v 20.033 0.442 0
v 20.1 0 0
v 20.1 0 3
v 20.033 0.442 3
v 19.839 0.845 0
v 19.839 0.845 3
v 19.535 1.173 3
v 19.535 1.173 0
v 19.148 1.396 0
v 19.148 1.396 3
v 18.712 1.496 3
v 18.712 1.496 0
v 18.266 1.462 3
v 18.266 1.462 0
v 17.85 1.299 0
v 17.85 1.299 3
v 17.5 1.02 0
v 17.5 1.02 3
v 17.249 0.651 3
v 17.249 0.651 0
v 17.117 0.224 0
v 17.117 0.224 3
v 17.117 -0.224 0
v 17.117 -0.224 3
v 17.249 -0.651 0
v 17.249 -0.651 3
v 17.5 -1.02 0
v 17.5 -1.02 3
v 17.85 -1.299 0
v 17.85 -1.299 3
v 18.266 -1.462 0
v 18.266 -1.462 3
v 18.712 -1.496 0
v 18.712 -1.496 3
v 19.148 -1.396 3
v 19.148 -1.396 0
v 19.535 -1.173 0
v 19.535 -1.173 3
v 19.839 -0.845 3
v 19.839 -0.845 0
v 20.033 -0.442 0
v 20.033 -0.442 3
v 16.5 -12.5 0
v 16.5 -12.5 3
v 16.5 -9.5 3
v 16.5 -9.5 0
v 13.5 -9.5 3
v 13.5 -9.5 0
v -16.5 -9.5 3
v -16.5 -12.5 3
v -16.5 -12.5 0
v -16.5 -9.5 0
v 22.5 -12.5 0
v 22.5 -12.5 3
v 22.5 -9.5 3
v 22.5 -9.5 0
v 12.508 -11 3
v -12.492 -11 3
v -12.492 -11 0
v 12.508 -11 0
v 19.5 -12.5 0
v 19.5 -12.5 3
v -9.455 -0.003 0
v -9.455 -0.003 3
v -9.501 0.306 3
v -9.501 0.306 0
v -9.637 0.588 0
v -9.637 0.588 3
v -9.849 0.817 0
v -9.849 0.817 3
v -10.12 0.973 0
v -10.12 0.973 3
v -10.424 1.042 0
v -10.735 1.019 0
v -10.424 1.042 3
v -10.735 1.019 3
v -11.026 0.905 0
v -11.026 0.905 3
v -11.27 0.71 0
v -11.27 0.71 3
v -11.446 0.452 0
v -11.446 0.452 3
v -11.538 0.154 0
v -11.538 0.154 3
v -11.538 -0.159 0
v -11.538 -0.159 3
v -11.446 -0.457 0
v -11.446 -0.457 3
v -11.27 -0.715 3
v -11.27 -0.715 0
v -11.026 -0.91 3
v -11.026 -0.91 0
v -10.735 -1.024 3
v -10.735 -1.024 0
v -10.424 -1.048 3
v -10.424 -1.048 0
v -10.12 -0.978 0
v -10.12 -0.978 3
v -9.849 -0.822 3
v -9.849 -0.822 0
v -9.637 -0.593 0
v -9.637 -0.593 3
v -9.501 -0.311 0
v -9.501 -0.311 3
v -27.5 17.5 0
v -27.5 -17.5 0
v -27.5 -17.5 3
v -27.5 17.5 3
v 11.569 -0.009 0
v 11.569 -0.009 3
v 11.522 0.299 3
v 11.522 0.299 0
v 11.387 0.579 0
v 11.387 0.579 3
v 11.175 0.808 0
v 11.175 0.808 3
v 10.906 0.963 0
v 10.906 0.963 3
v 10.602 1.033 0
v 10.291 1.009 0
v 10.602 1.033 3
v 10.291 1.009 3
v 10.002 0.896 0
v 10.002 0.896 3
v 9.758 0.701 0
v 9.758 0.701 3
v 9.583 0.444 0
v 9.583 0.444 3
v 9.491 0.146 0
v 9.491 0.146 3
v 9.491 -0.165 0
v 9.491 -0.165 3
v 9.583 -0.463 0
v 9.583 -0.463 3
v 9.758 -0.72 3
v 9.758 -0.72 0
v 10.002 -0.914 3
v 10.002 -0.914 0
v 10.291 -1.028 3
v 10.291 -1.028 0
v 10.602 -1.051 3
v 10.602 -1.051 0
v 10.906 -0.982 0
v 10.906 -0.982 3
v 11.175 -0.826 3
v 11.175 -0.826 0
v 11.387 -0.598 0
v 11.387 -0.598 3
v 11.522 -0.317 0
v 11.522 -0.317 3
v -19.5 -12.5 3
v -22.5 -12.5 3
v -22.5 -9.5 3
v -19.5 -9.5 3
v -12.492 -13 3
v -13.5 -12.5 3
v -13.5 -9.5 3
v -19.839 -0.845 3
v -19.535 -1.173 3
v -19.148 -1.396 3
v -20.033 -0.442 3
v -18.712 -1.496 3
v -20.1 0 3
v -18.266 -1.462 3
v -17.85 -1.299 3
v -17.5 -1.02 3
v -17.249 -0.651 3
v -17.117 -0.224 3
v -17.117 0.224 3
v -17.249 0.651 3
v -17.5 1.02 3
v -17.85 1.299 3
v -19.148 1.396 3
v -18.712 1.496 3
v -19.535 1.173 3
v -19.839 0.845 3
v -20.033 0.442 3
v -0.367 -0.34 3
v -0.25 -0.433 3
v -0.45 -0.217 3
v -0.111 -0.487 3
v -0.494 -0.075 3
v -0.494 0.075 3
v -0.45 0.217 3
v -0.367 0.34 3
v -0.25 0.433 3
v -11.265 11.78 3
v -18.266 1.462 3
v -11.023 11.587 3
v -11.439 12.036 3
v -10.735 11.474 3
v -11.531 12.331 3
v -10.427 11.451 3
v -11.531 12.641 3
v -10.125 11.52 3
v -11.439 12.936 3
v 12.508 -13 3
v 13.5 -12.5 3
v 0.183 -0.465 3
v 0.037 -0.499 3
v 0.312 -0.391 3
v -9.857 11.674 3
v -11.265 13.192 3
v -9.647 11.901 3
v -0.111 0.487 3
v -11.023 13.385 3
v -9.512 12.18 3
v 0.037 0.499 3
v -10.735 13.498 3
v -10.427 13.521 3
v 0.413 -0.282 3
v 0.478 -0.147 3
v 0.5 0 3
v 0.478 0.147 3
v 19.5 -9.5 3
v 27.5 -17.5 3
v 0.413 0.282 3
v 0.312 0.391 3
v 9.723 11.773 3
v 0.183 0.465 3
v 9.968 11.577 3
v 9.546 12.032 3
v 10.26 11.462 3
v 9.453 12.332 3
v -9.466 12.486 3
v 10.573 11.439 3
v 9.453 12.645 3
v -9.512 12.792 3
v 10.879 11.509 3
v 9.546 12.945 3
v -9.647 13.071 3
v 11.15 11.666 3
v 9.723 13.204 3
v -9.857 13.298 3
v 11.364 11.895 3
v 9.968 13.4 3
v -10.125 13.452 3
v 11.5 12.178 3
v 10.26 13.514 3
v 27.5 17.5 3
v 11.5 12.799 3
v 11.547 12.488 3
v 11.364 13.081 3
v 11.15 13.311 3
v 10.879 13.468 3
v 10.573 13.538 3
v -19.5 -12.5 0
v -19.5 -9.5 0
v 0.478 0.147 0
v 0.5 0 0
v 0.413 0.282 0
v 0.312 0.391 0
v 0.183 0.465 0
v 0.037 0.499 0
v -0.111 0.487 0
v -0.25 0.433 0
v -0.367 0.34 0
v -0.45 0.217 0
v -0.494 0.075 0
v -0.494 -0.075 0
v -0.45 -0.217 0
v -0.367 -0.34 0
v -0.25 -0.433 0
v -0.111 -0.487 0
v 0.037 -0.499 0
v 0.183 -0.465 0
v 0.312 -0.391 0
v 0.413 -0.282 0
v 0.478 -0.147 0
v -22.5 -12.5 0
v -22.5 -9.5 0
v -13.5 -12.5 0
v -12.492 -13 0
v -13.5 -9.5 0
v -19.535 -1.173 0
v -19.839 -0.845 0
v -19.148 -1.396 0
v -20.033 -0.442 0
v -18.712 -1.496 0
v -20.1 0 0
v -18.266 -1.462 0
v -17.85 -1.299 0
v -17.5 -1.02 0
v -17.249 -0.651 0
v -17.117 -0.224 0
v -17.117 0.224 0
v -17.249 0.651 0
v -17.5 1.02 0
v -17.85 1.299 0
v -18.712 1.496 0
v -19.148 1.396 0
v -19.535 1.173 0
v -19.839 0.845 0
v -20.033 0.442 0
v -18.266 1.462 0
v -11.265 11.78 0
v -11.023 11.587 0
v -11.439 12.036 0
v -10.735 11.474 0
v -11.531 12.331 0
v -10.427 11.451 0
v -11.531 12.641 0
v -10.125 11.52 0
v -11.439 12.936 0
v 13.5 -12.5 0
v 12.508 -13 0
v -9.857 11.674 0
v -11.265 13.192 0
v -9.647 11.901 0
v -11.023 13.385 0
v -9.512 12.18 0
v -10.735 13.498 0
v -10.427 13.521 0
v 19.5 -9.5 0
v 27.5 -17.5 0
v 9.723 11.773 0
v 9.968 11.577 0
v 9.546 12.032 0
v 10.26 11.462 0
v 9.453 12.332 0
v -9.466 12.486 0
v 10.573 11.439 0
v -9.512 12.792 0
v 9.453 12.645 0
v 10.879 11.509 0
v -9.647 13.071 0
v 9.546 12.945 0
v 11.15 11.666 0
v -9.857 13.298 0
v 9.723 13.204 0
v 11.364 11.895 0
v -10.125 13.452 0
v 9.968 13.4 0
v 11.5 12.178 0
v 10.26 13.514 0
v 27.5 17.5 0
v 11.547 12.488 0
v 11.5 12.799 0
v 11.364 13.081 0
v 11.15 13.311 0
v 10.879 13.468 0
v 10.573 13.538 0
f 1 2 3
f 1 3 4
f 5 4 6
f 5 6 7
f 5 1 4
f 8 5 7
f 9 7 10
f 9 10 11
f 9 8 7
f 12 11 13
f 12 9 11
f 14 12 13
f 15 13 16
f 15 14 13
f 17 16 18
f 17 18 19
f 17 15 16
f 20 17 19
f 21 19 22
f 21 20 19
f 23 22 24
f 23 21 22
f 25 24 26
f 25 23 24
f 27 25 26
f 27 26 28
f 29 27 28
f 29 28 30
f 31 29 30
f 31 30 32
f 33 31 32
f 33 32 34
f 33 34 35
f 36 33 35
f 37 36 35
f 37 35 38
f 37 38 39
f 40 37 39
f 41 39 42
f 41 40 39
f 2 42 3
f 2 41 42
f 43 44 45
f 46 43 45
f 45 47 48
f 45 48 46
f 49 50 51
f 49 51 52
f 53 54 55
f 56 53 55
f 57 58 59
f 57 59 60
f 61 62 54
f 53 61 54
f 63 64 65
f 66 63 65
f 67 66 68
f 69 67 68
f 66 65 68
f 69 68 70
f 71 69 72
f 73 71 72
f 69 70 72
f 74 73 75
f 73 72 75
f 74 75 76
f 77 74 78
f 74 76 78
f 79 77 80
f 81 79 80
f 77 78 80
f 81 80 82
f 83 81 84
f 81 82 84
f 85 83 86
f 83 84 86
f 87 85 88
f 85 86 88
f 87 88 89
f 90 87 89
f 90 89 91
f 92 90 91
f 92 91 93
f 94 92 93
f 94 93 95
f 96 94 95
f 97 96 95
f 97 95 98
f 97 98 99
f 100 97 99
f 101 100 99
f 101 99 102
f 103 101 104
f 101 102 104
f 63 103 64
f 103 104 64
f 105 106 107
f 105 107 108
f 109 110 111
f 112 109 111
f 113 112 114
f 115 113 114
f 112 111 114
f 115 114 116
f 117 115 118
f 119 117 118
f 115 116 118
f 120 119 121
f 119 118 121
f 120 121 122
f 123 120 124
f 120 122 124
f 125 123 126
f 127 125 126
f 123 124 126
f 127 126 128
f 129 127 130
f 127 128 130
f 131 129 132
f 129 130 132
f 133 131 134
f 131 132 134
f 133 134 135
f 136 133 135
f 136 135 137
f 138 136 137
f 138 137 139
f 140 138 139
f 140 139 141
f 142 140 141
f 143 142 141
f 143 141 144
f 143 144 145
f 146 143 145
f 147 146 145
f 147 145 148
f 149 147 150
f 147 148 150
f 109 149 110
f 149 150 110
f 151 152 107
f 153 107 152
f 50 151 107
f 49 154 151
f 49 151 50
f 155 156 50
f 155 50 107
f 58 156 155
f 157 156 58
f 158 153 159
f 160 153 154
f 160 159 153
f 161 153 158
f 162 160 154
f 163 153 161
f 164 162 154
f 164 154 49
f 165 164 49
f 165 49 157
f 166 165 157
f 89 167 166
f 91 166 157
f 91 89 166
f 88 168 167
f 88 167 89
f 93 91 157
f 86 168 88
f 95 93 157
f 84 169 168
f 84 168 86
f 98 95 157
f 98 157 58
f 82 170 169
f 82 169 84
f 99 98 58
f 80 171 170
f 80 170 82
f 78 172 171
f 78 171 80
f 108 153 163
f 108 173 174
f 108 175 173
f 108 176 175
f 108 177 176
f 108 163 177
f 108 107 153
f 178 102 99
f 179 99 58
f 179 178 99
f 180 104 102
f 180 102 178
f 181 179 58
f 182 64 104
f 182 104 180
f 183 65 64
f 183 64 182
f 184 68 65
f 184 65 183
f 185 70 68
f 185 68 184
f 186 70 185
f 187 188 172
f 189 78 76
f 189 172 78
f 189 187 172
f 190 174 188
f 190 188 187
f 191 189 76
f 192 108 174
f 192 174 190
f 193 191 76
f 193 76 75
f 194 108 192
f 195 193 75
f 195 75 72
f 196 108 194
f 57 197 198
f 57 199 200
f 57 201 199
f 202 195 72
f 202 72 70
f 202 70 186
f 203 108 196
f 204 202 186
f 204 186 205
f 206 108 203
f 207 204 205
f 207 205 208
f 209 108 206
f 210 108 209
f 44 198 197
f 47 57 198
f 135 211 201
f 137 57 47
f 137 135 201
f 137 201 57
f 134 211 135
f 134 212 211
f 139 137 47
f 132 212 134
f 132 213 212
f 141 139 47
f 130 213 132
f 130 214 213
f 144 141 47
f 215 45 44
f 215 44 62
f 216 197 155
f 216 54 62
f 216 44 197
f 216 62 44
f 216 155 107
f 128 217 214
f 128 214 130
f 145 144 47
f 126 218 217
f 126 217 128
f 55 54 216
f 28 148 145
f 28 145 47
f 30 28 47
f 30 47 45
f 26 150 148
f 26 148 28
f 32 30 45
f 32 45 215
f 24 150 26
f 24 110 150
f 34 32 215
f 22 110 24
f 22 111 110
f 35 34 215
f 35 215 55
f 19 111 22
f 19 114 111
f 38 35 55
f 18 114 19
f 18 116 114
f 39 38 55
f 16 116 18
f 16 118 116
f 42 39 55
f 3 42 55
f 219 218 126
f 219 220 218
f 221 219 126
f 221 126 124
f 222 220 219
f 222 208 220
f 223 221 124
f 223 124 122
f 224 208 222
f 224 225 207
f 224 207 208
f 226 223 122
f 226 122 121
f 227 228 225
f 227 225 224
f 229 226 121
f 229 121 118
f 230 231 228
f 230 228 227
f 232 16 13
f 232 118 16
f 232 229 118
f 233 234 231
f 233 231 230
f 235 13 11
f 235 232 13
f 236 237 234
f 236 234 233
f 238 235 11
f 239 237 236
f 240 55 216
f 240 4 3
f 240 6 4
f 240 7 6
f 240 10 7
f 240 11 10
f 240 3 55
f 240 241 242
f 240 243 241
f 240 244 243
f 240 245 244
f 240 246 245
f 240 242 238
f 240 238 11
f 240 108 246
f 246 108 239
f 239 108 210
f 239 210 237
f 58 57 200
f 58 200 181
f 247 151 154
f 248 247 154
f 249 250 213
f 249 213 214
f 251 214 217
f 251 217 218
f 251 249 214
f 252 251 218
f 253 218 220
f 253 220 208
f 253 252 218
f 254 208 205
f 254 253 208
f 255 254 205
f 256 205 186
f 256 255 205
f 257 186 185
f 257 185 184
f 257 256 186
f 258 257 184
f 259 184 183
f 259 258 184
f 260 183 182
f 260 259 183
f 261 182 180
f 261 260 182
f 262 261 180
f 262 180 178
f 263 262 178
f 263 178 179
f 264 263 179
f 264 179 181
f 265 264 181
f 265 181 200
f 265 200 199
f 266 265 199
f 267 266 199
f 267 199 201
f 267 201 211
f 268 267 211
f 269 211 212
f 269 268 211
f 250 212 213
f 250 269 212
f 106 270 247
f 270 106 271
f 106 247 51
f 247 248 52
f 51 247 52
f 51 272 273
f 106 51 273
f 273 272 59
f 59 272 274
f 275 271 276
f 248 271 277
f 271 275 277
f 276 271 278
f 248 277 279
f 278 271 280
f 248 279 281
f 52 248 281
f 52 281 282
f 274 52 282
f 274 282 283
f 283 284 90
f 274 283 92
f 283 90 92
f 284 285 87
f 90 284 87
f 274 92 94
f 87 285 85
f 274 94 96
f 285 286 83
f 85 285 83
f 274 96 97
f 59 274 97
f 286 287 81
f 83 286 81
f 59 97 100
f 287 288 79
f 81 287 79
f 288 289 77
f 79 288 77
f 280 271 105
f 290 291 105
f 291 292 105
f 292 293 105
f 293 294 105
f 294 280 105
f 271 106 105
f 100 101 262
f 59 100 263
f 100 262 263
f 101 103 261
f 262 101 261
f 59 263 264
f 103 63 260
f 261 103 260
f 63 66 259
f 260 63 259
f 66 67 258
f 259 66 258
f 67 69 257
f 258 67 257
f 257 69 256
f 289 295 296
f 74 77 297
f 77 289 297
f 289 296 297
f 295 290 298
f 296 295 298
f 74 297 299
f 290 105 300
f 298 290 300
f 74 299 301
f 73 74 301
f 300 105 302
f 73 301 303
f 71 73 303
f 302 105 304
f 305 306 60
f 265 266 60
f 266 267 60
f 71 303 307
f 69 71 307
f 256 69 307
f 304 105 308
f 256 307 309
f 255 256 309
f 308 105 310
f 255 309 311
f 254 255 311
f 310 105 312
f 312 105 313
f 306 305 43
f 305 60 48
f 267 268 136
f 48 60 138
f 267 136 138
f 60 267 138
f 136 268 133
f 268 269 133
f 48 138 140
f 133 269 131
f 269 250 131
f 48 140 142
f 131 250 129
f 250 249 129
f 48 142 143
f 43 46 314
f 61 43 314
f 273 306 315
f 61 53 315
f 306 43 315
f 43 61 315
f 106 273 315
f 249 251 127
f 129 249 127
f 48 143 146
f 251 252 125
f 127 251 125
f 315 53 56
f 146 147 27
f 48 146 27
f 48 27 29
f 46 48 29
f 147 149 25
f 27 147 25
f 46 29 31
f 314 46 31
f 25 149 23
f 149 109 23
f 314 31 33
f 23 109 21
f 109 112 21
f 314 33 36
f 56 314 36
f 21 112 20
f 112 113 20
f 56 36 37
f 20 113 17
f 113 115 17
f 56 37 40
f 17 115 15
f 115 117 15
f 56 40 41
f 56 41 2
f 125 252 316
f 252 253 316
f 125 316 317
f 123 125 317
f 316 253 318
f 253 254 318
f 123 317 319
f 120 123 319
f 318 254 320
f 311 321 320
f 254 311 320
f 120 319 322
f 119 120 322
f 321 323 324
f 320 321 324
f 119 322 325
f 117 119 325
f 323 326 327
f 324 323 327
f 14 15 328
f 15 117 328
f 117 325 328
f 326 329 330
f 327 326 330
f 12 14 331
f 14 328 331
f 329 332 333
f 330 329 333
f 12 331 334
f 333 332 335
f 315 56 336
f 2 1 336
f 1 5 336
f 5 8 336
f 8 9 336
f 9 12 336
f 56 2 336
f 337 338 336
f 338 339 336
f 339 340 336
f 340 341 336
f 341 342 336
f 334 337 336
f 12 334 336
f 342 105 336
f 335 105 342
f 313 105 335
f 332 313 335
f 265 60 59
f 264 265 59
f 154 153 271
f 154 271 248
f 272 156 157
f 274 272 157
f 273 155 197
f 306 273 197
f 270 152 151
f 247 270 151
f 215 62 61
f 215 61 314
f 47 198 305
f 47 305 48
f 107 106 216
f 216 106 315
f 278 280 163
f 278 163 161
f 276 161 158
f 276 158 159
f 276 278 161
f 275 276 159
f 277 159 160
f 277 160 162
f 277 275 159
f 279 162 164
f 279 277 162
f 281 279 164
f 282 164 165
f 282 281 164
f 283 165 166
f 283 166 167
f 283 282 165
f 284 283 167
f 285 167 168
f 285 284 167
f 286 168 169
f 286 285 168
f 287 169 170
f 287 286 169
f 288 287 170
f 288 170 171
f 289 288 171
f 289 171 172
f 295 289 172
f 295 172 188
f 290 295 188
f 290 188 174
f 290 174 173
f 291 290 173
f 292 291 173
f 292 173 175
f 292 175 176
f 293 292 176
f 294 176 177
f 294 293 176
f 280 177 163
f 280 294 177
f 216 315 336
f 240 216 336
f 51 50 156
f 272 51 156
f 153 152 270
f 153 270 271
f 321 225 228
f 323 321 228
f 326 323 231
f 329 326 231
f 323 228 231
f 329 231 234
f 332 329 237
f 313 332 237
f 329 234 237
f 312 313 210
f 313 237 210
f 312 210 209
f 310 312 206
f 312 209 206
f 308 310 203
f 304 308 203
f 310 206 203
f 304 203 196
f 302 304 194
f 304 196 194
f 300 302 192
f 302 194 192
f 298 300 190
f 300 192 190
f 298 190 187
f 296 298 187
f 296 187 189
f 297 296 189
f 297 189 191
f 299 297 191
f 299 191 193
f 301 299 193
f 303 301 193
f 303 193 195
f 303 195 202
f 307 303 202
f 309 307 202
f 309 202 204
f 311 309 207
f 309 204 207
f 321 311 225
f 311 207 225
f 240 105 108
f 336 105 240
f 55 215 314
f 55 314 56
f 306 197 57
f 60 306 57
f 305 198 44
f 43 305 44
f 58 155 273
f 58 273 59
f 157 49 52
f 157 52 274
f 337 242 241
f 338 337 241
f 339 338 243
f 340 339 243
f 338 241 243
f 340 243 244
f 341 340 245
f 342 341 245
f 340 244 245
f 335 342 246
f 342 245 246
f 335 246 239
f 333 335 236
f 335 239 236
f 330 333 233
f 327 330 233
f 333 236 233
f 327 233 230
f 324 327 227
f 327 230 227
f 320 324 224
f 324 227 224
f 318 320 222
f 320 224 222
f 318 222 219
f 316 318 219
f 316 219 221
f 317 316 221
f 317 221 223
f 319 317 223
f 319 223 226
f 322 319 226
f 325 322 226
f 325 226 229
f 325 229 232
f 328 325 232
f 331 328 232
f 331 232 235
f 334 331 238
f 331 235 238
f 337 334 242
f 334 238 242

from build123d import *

# Parameters (mm, degrees)
SKETCH1_W           = 55
SKETCH1_H           = 35
SKETCH1_R           = 1.5
SKETCH1_R_2         = 0.5
BOSS_EXTRUDE1_DEPTH = 3
SKETCH2_W           = 25
SKETCH2_H           = 2
CUT_EXTRUDE1_DEPTH  = 4
SKETCH3_W           = 3
SKETCH3_H           = 3
CUT_EXTRUDE2_DEPTH  = 3
SKETCH4_R           = 1.047817358
SKETCH4_R_2         = 1.044805948
CUT_EXTRUDE3_DEPTH  = 3
SKETCH5_R           = 1.037971053
SKETCH5_R_2         = 1.052489193
CUT_EXTRUDE4_DEPTH  = 3


with BuildPart() as part:
    # Sketch1 → Boss-Extrude1 (new body)
    with BuildSketch(Plane.XY):
        Rectangle(SKETCH1_W, SKETCH1_H)
        with Locations((18.6, 0)):
            Circle(SKETCH1_R, mode=Mode.SUBTRACT)
        with Locations(Location((-18.6, 0, 0), (0, 0, 180))):
            Circle(SKETCH1_R, mode=Mode.SUBTRACT)
        Circle(SKETCH1_R_2, mode=Mode.SUBTRACT)
    extrude(amount=BOSS_EXTRUDE1_DEPTH)

    # Sketch2 → Cut-Extrude1 (cut)
    with BuildSketch(Plane.XY.offset(3)):
        with Locations((0.008423928, -12)):
            Rectangle(SKETCH2_W, SKETCH2_H)
    extrude(amount=-CUT_EXTRUDE1_DEPTH, mode=Mode.SUBTRACT)

    # Sketch3 → Cut-Extrude2 (cut)
    with BuildSketch(Plane.XY.offset(3)):
        with Locations((-21, -11)):
            Rectangle(SKETCH3_W, SKETCH3_H)
        with Locations((-15, -11)):
            Rectangle(SKETCH3_W, SKETCH3_H)
        with Locations((15, -11)):
            Rectangle(SKETCH3_W, SKETCH3_H)
        with Locations((21, -11)):
            Rectangle(SKETCH3_W, SKETCH3_H)
    extrude(amount=-CUT_EXTRUDE2_DEPTH, mode=Mode.SUBTRACT)

    # Sketch4 → Cut-Extrude3 (cut)
    with BuildSketch(Plane.XY.offset(3)):
        with Locations((-10.502321648, -0.002631042)):
            Circle(SKETCH4_R)
        with Locations((10.523984619, -0.009290749)):
            Circle(SKETCH4_R_2)
    extrude(amount=-CUT_EXTRUDE3_DEPTH, mode=Mode.SUBTRACT)

    # Sketch5 → Cut-Extrude4 (cut)
    with BuildSketch(Plane.XY.offset(3)):
        with Locations((-10.504210452, 12.485998178)):
            Circle(SKETCH5_R)
        with Locations((10.494217, 12.488375227)):
            Circle(SKETCH5_R_2)
    extrude(amount=-CUT_EXTRUDE4_DEPTH, mode=Mode.SUBTRACT)


solid = part.part
